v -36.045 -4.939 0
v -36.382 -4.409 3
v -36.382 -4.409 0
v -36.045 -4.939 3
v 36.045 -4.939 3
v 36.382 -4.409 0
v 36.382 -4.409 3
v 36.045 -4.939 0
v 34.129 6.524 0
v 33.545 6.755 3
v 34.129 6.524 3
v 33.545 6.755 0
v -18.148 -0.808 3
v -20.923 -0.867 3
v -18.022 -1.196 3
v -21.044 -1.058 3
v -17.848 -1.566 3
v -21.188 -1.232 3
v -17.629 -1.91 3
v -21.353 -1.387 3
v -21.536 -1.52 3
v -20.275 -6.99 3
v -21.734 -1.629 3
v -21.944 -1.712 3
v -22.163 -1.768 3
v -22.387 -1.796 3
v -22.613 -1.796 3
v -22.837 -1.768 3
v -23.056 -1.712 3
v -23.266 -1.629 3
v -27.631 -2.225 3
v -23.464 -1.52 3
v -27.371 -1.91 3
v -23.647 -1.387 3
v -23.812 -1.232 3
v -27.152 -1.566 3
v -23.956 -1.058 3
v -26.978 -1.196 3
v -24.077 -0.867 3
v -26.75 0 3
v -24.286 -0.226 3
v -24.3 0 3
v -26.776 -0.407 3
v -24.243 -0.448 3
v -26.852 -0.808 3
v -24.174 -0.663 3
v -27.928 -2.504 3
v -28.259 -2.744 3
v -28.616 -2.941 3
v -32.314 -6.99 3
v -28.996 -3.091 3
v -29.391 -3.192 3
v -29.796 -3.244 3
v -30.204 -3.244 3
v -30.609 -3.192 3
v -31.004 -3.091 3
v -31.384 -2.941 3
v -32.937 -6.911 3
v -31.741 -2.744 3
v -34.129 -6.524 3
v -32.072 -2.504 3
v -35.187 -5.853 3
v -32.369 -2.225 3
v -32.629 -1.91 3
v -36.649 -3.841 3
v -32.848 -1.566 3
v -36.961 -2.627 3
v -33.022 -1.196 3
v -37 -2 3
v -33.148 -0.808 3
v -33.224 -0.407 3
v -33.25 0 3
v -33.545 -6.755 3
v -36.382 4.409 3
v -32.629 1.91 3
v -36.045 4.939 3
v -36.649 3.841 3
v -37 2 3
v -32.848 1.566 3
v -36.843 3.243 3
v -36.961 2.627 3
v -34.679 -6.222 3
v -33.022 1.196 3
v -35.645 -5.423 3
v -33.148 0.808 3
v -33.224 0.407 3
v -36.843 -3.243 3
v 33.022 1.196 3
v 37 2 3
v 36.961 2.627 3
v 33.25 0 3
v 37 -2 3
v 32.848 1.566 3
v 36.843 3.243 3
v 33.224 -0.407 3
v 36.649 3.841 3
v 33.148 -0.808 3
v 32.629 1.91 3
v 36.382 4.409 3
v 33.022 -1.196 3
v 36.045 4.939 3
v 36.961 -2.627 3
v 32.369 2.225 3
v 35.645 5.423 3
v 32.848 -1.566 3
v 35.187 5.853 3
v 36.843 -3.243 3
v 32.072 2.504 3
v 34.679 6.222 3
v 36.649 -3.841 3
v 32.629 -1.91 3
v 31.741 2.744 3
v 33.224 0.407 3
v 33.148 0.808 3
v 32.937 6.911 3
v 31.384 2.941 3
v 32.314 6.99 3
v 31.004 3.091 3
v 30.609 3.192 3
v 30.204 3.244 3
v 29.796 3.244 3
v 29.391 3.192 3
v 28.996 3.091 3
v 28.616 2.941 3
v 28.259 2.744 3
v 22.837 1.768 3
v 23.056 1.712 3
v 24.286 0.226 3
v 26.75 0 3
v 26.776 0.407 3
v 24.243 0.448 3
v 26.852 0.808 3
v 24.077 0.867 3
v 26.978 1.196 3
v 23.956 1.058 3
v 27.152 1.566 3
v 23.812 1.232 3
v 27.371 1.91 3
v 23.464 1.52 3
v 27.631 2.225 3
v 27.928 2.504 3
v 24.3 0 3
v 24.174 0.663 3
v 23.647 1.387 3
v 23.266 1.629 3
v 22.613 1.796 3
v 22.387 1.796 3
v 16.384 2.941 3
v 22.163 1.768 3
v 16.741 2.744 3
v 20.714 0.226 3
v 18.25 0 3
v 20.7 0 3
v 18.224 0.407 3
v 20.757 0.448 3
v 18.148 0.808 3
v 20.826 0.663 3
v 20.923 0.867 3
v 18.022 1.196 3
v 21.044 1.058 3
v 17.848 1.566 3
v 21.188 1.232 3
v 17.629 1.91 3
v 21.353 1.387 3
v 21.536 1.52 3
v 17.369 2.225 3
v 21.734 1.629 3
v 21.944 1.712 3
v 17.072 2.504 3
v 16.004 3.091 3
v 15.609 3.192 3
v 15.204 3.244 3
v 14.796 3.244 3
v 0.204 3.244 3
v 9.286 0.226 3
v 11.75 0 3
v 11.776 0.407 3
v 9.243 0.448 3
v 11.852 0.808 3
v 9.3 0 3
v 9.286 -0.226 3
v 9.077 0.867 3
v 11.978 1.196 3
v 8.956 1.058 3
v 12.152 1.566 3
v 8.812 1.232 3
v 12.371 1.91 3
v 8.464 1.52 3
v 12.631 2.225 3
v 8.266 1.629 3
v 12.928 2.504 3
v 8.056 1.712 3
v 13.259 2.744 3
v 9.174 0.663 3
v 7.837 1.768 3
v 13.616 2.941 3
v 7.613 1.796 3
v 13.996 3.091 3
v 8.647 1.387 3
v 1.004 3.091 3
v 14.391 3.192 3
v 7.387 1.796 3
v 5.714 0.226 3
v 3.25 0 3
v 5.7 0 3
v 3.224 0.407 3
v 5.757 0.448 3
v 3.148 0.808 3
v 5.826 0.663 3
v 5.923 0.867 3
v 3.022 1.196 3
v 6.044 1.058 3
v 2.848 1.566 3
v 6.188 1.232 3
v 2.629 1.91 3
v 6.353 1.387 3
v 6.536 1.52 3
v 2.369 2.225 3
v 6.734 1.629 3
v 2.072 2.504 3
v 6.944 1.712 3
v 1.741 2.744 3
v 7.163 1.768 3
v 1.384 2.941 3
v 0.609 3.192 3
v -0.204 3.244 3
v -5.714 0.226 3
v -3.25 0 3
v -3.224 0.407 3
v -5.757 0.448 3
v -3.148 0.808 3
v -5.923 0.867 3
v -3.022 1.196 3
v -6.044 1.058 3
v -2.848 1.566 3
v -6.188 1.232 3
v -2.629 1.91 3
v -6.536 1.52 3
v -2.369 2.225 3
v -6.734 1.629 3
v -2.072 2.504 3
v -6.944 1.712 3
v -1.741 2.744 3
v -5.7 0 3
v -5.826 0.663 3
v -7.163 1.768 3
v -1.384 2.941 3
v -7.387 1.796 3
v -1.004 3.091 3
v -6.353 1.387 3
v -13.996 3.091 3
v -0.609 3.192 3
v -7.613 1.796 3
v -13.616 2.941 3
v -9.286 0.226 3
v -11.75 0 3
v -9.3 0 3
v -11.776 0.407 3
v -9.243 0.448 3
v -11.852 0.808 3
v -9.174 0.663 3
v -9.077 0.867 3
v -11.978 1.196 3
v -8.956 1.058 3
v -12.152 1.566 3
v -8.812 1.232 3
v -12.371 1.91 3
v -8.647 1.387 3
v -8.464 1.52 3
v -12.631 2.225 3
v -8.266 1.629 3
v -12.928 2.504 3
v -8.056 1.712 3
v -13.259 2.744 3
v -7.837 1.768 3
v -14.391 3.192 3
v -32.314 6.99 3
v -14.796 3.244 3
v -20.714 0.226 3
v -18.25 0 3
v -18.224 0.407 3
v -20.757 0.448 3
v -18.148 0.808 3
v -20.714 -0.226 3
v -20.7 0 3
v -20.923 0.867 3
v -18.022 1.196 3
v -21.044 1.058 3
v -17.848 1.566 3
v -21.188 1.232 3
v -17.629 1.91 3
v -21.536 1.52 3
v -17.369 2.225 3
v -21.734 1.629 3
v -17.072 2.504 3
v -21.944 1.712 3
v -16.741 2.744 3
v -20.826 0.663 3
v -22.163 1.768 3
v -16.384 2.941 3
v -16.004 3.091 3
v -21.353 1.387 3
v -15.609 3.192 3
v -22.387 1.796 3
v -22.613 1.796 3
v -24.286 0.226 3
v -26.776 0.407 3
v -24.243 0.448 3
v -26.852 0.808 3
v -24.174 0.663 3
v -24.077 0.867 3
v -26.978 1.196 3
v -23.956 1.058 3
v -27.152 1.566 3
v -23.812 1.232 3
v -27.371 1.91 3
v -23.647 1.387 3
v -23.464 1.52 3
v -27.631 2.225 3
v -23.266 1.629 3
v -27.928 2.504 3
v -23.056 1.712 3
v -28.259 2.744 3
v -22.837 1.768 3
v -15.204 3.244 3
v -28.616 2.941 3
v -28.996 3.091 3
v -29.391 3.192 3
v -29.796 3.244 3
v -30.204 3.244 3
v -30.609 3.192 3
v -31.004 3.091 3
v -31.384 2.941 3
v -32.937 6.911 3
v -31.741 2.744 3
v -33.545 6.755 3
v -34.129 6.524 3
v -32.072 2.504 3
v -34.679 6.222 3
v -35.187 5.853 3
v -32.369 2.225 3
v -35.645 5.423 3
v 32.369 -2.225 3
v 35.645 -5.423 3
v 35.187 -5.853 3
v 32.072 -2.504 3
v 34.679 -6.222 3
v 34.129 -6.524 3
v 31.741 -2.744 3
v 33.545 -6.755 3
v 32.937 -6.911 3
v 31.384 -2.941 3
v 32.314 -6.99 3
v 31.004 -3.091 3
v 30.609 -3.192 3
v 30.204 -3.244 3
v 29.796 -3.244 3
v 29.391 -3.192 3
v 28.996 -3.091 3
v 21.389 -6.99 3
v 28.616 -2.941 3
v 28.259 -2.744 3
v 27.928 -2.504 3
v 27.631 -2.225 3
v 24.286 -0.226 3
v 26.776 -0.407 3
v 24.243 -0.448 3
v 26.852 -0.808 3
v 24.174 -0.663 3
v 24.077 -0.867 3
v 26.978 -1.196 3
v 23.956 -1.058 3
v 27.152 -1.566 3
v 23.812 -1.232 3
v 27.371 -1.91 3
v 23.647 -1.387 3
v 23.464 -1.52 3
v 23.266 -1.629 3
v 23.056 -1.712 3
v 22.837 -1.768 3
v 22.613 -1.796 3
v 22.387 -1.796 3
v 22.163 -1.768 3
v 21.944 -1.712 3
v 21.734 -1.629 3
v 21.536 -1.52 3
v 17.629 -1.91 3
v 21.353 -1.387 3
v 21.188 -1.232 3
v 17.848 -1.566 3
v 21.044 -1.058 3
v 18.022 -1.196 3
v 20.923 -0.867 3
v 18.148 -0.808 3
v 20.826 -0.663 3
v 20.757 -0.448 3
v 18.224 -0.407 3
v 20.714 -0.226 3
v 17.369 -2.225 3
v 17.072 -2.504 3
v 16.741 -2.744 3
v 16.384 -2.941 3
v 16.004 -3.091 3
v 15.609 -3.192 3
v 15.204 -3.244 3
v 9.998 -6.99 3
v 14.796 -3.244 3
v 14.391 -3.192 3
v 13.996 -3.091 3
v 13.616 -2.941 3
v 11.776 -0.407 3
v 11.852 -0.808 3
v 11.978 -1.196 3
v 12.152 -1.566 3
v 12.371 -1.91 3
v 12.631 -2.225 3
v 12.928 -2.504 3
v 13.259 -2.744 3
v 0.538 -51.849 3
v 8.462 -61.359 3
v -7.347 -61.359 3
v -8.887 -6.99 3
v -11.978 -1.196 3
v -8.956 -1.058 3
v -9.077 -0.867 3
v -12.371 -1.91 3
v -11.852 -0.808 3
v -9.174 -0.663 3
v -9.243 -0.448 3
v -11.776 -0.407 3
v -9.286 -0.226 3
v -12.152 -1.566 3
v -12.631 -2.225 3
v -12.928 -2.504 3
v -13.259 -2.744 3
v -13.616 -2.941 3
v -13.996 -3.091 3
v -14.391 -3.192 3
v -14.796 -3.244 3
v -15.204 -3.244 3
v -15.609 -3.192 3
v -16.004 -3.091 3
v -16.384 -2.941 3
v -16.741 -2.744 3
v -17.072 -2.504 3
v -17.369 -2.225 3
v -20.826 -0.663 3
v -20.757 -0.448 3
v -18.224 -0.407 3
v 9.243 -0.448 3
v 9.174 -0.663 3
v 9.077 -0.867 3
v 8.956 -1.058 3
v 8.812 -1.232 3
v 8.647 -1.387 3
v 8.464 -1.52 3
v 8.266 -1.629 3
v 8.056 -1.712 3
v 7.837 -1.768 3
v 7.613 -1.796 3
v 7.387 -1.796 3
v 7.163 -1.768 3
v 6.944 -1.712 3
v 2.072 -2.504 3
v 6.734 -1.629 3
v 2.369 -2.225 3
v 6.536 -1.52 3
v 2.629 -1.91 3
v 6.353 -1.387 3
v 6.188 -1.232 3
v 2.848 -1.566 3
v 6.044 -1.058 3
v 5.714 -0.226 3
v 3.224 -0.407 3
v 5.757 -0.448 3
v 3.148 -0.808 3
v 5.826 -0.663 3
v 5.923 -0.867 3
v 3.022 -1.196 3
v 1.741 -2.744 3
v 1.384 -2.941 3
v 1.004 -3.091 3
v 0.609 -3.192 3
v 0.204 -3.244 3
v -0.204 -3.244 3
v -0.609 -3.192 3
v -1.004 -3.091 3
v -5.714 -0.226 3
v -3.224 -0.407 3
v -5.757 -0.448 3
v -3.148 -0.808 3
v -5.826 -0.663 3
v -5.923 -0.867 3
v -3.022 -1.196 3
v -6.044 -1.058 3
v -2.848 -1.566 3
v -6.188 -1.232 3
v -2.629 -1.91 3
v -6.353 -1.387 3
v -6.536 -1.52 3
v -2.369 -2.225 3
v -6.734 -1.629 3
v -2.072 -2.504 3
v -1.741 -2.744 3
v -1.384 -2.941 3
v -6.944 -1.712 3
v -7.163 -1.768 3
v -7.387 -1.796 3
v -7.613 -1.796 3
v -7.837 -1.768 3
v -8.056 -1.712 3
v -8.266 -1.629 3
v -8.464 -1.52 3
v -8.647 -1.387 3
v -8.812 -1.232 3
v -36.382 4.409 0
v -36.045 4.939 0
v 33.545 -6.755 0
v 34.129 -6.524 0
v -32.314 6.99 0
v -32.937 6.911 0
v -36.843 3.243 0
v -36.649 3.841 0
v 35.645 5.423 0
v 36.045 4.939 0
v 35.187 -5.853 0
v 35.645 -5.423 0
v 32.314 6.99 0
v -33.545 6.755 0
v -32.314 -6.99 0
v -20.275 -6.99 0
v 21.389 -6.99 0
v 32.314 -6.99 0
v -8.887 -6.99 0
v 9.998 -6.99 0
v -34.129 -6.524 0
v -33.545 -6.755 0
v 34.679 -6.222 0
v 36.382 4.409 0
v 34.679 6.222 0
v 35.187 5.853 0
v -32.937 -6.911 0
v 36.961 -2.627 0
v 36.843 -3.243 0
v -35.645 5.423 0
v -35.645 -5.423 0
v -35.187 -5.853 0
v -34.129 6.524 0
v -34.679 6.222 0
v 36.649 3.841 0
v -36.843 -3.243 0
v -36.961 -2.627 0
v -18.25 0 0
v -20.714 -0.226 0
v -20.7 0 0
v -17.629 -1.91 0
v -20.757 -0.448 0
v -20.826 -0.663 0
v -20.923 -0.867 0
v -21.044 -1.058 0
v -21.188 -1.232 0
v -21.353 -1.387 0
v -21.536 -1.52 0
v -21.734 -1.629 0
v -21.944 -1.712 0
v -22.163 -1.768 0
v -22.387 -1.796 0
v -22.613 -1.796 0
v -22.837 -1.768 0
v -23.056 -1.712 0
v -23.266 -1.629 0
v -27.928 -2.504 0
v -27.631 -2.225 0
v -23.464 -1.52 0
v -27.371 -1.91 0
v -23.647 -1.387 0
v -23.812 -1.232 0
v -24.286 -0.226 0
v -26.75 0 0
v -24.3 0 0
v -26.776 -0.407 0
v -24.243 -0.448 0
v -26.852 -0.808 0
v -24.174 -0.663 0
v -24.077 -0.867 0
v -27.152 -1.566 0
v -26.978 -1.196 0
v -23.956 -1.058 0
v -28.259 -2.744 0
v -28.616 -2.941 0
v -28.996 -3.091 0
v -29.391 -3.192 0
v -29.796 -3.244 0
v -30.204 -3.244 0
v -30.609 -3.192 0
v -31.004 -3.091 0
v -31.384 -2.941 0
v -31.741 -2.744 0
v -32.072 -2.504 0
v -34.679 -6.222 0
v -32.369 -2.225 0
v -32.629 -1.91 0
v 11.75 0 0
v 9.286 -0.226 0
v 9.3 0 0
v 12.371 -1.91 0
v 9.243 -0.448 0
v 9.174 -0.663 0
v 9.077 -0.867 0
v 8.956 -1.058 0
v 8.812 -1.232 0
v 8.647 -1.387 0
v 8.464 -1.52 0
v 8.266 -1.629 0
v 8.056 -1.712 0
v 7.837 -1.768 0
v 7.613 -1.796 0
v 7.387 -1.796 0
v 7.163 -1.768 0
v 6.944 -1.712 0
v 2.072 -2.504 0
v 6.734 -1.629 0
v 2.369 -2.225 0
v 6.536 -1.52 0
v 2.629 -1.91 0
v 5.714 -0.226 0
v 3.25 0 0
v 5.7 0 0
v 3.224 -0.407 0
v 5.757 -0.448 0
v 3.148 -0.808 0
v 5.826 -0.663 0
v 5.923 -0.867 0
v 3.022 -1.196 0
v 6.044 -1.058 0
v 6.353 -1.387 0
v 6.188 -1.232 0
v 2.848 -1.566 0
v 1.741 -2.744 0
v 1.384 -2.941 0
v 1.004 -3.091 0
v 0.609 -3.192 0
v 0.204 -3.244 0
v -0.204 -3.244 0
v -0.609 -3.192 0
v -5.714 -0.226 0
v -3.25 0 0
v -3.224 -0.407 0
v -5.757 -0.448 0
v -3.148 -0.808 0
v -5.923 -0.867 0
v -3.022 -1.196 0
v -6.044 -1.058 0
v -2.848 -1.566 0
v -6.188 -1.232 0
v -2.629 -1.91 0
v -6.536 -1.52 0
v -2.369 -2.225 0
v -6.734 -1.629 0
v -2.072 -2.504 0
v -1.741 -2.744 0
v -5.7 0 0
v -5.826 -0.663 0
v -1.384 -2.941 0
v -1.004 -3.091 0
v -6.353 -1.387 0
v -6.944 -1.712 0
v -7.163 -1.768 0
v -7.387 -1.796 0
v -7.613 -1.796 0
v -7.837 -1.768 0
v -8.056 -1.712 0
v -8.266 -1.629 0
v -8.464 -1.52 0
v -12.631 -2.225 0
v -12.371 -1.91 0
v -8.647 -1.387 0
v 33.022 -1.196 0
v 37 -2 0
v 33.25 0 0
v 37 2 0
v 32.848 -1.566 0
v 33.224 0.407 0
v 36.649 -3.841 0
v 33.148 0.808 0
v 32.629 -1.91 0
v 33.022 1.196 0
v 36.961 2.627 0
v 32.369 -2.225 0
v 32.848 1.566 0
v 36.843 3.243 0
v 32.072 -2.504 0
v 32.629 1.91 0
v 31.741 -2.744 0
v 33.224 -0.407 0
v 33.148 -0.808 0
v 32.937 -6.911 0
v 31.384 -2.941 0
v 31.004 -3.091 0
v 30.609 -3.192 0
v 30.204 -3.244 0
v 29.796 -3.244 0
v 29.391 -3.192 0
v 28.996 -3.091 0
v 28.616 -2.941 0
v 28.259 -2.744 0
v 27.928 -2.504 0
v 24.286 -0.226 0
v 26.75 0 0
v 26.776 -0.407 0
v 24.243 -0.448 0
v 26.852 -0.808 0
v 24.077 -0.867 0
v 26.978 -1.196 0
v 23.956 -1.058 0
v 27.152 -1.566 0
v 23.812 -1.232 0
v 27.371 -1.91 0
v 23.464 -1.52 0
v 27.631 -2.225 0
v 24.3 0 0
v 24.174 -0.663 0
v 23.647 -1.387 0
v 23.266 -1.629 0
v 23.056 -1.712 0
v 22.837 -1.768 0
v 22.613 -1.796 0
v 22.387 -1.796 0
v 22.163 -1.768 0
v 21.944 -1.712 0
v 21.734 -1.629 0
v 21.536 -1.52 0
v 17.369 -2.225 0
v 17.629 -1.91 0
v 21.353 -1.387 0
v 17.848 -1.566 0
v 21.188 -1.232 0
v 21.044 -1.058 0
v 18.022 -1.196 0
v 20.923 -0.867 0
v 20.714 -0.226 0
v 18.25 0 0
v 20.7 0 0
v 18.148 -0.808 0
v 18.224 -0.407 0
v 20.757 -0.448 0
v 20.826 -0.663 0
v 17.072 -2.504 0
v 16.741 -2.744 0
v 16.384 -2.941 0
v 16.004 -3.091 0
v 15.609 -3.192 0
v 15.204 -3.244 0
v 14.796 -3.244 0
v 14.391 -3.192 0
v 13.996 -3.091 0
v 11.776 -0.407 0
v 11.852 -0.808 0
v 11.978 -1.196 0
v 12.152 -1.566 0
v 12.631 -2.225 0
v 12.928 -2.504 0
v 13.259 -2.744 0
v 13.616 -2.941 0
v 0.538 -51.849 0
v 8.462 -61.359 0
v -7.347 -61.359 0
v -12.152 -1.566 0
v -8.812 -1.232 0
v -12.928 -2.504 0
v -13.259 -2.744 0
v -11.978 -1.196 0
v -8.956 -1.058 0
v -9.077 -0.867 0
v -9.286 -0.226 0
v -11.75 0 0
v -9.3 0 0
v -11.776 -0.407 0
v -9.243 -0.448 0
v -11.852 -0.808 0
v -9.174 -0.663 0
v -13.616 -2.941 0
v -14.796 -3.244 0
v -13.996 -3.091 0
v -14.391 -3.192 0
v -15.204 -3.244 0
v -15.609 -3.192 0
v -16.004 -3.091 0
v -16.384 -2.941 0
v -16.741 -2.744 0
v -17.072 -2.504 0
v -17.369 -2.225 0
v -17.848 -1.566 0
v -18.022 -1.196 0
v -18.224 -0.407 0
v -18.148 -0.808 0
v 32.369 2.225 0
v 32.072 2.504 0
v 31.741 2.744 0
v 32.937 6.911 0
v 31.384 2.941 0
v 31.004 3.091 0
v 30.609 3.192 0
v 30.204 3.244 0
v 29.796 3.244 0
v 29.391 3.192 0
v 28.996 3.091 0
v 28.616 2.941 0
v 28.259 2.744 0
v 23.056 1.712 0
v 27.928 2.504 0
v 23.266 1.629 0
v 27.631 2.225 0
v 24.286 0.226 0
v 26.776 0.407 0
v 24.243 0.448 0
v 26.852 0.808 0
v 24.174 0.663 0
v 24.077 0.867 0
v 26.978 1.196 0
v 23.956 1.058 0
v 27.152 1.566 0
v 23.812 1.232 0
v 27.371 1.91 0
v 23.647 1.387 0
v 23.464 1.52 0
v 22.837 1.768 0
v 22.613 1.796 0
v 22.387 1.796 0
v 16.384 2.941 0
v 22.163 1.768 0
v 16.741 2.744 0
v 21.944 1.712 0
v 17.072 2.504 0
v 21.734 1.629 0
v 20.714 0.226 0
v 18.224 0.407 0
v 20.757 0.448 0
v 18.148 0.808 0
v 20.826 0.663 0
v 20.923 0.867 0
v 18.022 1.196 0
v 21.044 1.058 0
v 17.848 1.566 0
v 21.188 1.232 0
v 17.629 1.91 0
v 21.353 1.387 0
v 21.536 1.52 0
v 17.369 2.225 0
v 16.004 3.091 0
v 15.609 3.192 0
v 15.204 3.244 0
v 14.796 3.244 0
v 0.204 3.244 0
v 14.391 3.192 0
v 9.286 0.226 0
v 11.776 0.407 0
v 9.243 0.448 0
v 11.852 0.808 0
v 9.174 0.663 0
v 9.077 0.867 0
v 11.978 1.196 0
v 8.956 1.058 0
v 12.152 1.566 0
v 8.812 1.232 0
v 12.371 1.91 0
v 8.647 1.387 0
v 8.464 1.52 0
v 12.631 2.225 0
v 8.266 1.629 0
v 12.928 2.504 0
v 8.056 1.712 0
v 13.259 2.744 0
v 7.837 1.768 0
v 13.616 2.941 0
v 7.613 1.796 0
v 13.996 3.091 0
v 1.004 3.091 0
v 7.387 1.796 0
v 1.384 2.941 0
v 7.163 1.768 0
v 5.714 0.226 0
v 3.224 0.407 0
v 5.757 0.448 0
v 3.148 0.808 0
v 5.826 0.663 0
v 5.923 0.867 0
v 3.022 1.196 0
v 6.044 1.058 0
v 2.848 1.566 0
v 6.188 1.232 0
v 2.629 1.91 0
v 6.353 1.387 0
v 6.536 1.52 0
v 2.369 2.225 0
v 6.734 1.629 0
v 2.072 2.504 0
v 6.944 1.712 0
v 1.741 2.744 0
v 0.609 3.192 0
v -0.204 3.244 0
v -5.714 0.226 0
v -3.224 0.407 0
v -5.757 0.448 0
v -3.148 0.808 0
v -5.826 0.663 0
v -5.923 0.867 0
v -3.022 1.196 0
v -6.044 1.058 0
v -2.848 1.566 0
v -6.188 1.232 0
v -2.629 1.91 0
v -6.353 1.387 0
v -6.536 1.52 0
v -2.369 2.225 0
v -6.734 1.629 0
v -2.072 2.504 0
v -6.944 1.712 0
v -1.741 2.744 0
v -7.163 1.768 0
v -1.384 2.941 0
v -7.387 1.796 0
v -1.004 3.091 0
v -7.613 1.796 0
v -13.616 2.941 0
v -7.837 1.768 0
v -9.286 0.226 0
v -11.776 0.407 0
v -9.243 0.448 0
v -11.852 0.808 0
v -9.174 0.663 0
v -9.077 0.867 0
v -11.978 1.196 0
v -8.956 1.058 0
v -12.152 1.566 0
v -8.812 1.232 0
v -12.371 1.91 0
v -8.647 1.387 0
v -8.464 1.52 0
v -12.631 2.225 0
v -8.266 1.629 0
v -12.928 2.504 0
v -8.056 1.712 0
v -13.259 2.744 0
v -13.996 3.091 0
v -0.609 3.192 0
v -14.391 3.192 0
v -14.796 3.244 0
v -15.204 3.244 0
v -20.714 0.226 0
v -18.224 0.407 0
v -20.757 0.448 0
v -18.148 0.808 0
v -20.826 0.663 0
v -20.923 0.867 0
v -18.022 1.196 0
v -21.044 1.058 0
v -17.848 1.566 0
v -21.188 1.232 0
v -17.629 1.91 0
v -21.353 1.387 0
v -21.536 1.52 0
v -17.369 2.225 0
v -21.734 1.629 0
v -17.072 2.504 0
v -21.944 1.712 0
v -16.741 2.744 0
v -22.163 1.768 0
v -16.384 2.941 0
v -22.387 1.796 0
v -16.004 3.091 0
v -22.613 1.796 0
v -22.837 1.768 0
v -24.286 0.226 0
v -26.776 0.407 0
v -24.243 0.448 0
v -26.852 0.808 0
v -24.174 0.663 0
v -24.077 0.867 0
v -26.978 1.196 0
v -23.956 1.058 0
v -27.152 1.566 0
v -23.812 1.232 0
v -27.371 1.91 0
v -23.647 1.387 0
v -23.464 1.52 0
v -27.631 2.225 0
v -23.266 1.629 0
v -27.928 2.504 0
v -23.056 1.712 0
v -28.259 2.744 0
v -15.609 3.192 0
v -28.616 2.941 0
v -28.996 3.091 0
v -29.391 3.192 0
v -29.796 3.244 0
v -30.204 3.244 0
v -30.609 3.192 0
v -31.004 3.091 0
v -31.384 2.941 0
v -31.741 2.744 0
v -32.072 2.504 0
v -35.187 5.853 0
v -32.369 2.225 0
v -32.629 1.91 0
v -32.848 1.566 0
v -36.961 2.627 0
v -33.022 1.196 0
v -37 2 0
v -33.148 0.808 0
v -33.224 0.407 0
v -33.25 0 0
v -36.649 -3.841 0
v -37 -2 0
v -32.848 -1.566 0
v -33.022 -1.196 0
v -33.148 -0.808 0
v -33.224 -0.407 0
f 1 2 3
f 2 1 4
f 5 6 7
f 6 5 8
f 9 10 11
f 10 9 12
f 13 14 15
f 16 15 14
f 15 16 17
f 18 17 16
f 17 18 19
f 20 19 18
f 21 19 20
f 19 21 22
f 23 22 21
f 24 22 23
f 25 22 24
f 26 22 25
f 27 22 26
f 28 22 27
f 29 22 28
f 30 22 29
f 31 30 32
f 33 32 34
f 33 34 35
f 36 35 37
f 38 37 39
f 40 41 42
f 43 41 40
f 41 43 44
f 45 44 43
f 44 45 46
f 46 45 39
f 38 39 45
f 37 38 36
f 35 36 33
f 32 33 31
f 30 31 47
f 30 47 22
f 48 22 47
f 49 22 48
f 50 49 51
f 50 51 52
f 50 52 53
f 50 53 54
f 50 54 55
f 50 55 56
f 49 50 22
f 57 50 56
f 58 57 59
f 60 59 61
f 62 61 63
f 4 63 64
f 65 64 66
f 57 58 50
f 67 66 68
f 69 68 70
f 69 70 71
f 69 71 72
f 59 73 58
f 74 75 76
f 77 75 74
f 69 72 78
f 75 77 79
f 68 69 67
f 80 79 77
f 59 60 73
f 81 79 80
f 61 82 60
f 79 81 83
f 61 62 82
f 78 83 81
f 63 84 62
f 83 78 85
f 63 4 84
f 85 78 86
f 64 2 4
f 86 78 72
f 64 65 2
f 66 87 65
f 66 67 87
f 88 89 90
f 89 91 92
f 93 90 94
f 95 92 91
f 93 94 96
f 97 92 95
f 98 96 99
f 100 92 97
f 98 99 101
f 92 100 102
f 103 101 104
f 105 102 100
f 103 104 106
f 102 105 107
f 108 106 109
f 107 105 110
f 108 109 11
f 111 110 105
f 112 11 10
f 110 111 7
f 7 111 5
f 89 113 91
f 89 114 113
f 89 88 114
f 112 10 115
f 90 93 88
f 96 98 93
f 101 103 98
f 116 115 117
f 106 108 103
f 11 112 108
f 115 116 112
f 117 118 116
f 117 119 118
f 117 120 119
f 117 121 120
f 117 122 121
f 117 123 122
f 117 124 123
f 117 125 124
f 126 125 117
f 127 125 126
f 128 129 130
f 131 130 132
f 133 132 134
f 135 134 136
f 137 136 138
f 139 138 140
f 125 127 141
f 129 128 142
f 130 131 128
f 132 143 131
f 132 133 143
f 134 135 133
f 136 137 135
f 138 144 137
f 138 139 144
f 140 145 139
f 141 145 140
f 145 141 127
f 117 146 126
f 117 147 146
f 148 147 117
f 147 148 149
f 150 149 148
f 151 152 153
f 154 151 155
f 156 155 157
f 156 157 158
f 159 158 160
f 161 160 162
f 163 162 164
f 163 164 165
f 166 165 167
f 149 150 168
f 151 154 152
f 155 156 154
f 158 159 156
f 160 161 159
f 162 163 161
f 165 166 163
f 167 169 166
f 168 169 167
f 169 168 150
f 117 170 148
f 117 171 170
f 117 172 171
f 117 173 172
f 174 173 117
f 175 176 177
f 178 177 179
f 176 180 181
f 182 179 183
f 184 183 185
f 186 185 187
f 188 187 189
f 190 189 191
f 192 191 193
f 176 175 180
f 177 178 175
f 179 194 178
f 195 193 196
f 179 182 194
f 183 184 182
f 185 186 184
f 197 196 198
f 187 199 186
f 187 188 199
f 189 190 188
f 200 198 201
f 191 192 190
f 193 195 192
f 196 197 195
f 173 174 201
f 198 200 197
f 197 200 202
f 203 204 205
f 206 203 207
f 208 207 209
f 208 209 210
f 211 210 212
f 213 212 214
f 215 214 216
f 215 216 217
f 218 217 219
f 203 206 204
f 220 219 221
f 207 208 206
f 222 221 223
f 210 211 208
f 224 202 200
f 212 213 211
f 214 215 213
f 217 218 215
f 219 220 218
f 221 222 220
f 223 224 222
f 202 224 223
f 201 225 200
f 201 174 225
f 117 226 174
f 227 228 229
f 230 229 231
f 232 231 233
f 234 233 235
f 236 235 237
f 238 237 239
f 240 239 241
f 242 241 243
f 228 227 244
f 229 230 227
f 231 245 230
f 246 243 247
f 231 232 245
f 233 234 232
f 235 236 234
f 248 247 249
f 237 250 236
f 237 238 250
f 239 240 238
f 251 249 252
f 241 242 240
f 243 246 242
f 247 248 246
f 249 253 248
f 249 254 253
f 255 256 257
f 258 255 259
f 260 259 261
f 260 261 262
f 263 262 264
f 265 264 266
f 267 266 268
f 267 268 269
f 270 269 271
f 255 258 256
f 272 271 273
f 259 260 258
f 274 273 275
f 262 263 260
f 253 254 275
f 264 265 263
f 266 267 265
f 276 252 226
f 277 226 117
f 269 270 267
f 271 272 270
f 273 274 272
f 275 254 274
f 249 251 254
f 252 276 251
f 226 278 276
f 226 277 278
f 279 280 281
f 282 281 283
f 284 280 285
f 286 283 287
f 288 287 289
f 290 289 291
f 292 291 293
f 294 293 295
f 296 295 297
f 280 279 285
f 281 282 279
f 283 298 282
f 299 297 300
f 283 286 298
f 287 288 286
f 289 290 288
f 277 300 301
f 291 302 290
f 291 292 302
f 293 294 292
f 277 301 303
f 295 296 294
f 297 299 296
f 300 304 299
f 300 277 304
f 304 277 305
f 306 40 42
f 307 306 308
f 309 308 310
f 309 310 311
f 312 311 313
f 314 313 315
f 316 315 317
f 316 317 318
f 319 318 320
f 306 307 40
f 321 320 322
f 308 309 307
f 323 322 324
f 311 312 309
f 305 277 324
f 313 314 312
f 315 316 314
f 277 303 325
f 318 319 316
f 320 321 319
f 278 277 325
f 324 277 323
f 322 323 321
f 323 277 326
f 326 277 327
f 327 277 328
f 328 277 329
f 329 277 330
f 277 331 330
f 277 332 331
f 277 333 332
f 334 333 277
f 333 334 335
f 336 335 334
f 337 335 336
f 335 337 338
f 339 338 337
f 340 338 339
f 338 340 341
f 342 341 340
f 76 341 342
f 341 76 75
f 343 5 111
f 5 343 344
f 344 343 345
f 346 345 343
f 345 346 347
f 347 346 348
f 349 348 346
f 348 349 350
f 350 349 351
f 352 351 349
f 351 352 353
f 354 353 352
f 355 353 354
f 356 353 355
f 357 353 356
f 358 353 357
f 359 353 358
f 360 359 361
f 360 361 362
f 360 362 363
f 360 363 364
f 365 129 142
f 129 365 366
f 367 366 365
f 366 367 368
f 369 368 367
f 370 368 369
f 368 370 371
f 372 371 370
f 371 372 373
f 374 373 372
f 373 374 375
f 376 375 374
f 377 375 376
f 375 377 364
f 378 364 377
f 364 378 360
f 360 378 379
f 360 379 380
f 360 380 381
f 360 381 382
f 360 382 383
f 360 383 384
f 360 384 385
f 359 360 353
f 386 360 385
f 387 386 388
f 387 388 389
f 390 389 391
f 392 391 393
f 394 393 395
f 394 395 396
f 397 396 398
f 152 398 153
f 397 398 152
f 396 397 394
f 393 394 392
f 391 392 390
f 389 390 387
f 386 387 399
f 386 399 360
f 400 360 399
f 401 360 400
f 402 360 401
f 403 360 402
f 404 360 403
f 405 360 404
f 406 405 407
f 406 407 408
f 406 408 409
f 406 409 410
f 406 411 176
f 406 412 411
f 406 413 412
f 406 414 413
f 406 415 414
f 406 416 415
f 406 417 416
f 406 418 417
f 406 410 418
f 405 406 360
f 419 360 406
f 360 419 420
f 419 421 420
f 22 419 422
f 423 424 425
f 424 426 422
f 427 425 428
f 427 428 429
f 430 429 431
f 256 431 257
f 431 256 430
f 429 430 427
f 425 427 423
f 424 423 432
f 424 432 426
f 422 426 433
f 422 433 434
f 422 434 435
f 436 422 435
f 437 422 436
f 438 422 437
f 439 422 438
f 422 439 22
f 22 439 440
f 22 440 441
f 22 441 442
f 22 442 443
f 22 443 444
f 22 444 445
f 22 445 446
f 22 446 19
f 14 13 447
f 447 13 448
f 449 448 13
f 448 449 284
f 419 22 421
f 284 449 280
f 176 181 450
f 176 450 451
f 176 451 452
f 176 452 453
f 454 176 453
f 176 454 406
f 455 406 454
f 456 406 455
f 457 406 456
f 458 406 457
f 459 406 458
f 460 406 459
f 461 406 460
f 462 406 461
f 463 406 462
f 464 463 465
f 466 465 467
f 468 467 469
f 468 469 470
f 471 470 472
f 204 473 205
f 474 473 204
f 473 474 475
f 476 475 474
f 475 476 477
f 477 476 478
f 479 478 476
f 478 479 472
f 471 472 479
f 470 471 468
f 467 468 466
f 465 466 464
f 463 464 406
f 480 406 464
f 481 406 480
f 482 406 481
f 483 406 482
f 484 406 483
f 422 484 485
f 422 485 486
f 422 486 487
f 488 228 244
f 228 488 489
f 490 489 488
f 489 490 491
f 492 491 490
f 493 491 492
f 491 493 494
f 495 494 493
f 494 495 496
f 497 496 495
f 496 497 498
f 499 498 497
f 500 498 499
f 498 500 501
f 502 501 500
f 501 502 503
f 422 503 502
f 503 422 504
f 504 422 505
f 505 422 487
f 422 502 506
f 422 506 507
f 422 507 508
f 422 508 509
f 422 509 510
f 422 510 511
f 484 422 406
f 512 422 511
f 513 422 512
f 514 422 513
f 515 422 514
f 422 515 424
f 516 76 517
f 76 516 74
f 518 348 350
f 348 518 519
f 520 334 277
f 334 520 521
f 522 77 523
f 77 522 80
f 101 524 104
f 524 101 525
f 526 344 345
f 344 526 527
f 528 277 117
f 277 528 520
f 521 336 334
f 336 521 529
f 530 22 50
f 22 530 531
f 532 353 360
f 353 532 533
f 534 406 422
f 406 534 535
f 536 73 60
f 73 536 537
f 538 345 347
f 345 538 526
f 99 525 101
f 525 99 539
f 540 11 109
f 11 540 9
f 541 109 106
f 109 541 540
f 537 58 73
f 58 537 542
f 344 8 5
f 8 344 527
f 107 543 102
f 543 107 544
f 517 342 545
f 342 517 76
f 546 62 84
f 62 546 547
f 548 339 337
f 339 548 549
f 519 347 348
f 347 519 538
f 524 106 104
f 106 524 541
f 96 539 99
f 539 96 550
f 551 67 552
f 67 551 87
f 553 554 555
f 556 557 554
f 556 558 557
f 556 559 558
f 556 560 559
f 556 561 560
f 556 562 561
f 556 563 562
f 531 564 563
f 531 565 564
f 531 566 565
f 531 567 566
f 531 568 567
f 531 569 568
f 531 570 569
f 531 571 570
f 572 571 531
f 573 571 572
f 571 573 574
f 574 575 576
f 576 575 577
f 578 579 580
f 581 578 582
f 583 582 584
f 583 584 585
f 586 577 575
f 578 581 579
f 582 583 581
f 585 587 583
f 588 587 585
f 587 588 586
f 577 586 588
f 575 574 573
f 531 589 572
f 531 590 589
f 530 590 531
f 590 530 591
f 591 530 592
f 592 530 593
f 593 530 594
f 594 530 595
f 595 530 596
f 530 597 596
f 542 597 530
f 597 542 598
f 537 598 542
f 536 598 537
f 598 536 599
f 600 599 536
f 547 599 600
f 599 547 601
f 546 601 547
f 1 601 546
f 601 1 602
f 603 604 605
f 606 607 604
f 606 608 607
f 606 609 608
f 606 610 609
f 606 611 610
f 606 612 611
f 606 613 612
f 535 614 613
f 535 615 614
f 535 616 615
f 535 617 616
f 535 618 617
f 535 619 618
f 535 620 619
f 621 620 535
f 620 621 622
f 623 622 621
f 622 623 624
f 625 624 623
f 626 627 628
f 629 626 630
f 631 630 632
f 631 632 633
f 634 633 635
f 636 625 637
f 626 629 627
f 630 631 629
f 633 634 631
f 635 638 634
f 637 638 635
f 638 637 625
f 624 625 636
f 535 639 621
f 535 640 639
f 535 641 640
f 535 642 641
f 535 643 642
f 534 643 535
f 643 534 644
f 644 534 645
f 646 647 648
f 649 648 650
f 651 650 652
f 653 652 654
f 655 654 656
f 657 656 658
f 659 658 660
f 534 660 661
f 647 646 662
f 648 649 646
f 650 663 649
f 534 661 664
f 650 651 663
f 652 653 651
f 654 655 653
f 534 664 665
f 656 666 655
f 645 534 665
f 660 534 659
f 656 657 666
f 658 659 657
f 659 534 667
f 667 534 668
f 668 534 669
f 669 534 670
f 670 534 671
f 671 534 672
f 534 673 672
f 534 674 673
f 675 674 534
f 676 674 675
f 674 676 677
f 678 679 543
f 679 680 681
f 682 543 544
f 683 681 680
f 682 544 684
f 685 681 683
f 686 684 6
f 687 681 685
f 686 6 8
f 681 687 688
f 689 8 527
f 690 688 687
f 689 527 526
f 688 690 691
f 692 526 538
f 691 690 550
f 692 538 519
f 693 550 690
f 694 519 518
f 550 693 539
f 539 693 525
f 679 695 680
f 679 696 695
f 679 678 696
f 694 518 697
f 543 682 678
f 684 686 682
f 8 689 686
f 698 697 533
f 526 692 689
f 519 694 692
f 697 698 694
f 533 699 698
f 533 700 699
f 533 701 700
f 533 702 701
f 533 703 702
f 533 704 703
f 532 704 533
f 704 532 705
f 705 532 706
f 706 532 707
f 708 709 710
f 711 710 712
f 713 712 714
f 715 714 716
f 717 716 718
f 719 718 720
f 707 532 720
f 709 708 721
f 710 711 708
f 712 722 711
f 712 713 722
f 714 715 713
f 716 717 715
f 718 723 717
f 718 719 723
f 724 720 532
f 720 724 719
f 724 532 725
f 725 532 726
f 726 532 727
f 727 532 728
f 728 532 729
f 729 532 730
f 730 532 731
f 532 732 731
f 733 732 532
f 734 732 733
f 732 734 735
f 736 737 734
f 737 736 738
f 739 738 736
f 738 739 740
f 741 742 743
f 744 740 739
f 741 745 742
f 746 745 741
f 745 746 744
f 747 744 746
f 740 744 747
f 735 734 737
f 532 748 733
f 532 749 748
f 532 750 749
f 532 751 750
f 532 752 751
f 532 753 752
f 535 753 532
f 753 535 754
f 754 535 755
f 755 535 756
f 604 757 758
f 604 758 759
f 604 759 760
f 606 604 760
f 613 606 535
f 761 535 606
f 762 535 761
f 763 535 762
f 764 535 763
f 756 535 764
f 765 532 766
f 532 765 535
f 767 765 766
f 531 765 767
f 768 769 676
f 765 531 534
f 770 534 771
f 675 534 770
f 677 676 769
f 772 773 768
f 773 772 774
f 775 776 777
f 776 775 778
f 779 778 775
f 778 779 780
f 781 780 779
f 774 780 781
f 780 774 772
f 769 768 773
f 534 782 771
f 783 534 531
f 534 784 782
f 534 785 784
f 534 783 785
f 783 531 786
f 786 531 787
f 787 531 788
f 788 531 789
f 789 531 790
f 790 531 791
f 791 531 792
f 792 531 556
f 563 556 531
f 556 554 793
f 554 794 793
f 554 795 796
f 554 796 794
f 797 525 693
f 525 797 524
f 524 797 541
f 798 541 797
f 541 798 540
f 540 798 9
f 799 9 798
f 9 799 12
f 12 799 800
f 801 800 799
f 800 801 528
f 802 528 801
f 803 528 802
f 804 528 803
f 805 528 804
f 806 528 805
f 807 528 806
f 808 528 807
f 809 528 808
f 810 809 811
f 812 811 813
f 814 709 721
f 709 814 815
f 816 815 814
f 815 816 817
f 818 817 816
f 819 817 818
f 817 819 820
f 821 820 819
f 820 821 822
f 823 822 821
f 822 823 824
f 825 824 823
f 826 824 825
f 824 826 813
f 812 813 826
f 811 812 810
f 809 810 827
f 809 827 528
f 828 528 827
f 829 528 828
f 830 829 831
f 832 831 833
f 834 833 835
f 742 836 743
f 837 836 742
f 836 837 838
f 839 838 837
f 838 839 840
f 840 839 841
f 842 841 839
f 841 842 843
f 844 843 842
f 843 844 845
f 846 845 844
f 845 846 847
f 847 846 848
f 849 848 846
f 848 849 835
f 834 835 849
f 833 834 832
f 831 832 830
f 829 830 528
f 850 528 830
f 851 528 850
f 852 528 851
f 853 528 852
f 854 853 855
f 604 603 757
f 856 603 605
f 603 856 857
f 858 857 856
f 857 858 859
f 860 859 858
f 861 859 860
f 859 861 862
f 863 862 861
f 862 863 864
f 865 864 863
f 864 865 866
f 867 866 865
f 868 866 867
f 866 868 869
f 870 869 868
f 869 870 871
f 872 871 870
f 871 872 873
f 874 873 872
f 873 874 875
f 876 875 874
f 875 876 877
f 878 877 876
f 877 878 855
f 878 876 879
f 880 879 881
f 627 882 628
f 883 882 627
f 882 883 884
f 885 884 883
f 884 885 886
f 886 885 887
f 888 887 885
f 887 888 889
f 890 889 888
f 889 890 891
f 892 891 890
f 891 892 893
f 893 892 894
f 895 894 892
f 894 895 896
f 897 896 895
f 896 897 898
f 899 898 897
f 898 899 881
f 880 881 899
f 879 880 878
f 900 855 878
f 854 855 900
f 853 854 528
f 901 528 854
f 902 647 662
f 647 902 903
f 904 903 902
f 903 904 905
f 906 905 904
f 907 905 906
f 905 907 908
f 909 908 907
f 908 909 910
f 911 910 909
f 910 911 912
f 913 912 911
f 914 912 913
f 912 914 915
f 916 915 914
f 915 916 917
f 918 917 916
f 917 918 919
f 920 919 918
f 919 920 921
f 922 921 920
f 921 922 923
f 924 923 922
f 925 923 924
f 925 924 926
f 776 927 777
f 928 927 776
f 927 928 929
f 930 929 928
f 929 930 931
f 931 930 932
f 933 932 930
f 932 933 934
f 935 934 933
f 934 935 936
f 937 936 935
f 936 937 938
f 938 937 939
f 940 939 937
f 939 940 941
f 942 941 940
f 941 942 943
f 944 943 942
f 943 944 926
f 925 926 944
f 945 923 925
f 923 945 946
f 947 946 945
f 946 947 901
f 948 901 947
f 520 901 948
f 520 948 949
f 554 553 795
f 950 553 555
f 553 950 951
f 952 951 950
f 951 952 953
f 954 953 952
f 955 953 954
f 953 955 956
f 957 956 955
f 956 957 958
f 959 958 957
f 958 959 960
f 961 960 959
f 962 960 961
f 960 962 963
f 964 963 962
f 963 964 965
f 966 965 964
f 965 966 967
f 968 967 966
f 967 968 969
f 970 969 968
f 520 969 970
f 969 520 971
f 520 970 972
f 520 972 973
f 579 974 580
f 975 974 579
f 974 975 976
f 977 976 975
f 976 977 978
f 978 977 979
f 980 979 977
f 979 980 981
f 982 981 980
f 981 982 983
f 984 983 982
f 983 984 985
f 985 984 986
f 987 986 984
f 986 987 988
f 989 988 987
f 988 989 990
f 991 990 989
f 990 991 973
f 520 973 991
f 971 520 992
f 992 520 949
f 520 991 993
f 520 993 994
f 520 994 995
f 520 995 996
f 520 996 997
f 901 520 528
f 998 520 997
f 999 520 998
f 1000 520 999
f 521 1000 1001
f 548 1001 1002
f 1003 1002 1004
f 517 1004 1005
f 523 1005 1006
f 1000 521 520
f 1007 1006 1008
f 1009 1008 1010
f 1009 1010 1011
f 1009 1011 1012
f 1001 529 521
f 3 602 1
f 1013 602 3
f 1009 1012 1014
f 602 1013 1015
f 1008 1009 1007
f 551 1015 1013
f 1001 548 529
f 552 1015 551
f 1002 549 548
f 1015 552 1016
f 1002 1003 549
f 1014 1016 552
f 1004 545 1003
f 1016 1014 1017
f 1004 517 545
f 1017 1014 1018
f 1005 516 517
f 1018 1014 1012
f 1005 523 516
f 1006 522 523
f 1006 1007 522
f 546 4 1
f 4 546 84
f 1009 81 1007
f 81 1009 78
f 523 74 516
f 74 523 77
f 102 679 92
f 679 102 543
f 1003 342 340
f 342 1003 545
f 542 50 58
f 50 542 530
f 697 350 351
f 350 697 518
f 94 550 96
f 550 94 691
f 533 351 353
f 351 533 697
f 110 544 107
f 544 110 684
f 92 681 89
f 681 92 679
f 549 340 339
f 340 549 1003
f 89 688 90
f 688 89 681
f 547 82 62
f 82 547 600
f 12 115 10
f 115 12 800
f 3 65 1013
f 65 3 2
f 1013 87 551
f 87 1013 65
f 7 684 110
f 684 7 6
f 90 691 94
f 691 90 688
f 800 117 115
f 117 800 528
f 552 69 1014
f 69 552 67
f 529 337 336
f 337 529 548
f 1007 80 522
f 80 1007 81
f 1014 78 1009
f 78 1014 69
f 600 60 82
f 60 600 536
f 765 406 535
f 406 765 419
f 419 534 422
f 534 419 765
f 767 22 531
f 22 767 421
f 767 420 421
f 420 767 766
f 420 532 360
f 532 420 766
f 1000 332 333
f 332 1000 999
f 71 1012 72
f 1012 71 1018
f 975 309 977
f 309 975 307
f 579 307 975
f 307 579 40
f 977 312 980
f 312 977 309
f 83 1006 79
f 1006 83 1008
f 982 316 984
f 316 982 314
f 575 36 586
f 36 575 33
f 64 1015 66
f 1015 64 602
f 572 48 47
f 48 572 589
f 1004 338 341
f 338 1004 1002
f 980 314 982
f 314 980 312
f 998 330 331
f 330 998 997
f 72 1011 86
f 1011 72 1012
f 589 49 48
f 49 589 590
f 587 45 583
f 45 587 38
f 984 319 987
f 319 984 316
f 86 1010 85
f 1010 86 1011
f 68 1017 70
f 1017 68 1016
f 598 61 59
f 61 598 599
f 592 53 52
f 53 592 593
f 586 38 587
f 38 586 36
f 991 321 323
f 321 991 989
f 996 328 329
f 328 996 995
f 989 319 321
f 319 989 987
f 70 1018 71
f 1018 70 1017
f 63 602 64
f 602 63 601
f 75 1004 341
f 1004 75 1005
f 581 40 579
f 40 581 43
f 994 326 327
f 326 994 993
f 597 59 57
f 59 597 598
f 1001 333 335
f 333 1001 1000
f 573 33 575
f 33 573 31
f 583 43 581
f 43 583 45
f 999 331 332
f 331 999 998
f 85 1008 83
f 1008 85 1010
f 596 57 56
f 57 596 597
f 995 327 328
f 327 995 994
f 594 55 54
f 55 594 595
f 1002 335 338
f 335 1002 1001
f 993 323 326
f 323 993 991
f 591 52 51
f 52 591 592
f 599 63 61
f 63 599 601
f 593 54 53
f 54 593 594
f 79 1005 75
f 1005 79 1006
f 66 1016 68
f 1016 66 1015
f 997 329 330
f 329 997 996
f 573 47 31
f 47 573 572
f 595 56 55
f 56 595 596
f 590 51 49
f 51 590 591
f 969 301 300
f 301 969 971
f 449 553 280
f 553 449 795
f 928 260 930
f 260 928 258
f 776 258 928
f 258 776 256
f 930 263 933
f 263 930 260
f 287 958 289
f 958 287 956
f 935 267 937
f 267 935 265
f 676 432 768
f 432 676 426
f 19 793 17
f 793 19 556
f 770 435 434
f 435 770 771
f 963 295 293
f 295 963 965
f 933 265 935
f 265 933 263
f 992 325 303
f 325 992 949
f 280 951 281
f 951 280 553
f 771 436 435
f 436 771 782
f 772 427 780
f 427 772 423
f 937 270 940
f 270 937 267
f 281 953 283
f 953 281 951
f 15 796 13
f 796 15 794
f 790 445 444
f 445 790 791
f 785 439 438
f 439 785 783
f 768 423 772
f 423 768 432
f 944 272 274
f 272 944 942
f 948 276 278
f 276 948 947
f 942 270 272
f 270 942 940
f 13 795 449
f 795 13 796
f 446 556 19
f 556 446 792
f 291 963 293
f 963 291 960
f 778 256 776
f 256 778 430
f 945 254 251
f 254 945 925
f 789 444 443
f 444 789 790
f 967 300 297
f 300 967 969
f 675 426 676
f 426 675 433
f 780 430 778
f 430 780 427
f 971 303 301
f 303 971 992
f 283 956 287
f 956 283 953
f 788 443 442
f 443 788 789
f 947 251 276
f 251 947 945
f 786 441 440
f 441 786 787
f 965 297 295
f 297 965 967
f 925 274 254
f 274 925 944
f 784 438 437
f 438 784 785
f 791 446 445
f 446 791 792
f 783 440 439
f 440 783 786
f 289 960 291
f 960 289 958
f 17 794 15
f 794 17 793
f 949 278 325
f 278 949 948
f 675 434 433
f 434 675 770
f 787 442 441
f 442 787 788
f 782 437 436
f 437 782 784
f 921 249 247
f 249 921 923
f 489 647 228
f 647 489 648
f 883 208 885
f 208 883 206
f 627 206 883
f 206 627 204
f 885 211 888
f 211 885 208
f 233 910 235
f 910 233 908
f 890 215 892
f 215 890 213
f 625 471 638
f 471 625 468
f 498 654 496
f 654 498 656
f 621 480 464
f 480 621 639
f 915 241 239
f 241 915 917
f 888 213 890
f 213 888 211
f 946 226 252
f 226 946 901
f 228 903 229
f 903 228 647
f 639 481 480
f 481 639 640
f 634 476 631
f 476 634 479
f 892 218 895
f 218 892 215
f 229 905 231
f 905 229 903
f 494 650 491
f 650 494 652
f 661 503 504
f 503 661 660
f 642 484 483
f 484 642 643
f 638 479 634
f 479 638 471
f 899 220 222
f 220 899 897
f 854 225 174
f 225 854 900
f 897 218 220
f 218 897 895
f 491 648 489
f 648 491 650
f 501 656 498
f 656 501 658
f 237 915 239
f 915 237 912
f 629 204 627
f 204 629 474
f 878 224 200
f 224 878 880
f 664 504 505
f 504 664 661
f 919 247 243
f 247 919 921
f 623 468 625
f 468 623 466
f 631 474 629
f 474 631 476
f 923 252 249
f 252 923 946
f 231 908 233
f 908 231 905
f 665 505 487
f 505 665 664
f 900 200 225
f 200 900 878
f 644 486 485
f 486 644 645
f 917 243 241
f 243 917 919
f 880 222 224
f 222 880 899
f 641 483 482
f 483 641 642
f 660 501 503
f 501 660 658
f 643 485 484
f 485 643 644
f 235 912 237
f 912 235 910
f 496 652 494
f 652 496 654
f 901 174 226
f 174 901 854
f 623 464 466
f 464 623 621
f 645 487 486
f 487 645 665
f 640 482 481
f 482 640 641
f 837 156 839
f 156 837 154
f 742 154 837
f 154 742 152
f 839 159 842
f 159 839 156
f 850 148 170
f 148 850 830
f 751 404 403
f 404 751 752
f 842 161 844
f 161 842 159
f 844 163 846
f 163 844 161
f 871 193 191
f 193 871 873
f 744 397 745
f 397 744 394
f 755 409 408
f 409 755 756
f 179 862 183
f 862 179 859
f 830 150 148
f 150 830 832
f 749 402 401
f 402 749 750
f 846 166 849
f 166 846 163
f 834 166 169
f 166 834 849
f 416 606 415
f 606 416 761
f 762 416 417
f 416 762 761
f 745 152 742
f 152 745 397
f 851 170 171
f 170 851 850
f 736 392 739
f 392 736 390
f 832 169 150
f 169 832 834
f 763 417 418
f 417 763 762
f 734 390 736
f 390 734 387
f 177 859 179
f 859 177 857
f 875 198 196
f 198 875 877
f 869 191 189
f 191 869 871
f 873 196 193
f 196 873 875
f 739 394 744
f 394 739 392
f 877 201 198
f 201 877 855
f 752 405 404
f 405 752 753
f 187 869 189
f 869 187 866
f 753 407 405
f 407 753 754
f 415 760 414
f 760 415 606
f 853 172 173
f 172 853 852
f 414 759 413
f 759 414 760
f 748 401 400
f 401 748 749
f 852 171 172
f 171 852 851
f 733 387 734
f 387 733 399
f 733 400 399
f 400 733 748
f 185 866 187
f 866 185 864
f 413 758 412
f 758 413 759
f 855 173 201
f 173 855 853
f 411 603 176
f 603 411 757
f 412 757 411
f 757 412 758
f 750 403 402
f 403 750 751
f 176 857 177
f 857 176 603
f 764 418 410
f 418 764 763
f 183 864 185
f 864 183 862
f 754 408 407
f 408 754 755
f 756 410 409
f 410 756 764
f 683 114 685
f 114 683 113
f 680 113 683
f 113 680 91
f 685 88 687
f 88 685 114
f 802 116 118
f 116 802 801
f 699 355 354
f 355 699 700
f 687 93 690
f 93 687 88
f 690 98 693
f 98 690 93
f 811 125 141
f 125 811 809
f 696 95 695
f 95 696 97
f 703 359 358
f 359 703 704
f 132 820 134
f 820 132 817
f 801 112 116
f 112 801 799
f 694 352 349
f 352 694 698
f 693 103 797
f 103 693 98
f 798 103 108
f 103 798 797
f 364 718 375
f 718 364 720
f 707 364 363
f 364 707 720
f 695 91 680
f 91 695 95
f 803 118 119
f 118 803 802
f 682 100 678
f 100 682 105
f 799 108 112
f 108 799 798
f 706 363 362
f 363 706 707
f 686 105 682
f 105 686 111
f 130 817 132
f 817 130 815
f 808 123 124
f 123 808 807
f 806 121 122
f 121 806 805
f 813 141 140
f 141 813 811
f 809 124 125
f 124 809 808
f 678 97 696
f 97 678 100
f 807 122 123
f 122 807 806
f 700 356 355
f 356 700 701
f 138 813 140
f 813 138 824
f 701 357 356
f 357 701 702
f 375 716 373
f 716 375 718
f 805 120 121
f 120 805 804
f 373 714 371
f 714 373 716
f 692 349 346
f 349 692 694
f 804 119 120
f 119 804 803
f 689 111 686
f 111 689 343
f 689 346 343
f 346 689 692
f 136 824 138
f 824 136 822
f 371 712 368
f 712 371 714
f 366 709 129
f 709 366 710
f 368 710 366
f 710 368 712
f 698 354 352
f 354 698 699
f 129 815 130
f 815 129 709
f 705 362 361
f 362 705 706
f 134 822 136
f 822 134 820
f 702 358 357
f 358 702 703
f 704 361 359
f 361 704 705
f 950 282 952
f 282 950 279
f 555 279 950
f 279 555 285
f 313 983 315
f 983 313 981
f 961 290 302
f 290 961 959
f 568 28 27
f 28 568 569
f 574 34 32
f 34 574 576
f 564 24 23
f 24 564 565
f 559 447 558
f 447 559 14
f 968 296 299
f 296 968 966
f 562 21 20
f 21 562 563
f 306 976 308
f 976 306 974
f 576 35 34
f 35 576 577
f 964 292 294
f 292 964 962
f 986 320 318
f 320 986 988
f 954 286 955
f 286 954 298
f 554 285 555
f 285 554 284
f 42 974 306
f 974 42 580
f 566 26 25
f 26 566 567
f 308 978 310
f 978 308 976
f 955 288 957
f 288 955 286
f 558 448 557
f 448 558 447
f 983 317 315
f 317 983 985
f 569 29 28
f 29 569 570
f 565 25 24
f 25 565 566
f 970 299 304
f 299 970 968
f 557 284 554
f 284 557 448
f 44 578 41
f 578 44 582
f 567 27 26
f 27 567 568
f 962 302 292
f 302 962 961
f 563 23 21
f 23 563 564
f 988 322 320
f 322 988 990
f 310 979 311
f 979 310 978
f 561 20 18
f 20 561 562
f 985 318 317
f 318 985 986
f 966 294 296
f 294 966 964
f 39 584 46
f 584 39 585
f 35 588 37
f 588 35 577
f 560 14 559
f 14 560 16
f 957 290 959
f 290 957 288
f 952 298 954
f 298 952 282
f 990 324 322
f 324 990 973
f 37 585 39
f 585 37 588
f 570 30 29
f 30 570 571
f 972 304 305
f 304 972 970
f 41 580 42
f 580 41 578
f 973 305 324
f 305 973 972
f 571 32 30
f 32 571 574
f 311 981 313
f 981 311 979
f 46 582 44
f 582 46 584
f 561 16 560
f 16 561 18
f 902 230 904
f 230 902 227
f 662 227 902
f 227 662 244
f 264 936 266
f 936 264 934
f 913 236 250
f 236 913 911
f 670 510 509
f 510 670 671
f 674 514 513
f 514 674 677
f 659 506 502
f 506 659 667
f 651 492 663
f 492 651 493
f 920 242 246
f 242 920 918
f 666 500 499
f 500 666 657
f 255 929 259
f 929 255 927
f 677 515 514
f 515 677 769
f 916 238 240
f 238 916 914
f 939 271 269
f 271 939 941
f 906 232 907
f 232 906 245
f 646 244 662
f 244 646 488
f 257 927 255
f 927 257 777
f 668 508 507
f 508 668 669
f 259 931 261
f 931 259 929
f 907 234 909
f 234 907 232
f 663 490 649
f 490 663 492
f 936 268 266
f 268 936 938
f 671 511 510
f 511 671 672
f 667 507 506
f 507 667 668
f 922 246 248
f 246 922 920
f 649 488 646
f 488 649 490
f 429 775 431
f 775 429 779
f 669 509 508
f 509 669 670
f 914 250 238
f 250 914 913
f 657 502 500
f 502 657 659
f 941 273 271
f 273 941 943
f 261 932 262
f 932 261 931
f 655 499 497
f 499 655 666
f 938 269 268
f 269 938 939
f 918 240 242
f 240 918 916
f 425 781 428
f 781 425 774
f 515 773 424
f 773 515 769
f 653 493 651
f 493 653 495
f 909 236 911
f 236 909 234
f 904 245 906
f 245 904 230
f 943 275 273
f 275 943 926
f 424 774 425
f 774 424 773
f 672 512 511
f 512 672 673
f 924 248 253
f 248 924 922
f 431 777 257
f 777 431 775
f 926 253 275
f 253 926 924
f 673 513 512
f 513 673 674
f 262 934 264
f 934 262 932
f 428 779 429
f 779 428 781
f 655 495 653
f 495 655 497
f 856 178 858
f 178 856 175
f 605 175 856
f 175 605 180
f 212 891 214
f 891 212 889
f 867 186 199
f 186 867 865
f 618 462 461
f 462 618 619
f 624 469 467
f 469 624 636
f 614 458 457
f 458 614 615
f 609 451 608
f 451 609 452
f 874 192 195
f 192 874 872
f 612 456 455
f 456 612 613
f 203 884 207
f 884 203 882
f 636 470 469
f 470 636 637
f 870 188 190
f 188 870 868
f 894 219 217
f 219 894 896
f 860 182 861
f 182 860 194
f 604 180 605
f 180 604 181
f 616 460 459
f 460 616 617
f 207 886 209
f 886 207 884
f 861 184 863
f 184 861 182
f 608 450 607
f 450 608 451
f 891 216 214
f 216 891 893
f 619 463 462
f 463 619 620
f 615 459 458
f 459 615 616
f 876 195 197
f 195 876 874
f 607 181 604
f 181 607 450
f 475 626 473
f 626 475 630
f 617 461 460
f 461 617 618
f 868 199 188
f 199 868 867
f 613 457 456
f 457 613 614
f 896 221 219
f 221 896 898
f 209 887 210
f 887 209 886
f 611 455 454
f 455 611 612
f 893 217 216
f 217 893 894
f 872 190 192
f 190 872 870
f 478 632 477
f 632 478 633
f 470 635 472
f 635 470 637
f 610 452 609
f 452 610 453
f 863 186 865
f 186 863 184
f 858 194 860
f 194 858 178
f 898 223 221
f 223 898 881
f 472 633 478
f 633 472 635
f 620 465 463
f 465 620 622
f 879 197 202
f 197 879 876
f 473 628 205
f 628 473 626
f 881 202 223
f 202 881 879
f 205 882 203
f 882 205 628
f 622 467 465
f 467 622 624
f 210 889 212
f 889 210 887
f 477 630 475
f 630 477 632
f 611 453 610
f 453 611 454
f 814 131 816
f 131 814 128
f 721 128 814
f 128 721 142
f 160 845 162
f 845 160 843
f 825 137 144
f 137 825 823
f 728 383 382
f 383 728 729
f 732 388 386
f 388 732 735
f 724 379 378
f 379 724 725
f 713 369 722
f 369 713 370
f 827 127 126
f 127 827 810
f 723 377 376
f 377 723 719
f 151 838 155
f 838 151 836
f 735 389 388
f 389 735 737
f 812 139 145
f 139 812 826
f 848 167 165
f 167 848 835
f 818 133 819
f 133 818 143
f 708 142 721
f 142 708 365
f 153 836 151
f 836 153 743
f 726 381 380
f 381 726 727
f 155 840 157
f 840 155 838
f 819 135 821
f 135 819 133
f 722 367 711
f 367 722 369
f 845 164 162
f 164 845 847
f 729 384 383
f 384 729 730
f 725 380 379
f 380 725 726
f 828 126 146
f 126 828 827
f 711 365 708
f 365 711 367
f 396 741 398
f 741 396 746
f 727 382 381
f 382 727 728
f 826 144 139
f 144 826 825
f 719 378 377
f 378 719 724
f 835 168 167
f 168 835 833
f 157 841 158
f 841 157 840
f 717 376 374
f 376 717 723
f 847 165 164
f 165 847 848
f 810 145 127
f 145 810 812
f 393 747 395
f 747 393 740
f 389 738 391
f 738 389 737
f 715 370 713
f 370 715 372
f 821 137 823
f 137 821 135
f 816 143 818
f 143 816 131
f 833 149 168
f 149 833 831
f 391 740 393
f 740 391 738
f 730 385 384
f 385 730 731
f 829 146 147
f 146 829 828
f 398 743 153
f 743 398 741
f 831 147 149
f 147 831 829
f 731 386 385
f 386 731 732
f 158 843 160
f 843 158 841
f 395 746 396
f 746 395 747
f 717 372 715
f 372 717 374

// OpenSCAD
$fn = 50;


difference() {
	union() {
		hull() {
			translate(v = [-32.0000000000, 2.0000000000, 0]) {
				cylinder(h = 3, r = 5);
			}
			translate(v = [32.0000000000, 2.0000000000, 0]) {
				cylinder(h = 3, r = 5);
			}
			translate(v = [-32.0000000000, -2.0000000000, 0]) {
				cylinder(h = 3, r = 5);
			}
			translate(v = [32.0000000000, -2.0000000000, 0]) {
				cylinder(h = 3, r = 5);
			}
		}
		translate(v = [0, -5, 0]) {
			linear_extrude(height = 3) {
				text(font = "DejaVu Sans Mono:style=Bold", halign = "center", size = 57.0000000000, text = "V", valign = "top");
			}
		}
	}
	union() {
		translate(v = [-30.0000000000, 0.0000000000, 0]) {
			translate(v = [0, 0, -100]) {
				cylinder(h = 200, r = 3.2500000000);
			}
		}
		translate(v = [-15.0000000000, 0.0000000000, 0]) {
			translate(v = [0, 0, -100]) {
				cylinder(h = 200, r = 3.2500000000);
			}
		}
		translate(v = [0, 0, -100]) {
			cylinder(h = 200, r = 3.2500000000);
		}
		translate(v = [15.0000000000, 0.0000000000, 0]) {
			translate(v = [0, 0, -100]) {
				cylinder(h = 200, r = 3.2500000000);
			}
		}
		translate(v = [30.0000000000, 0.0000000000, 0]) {
			translate(v = [0, 0, -100]) {
				cylinder(h = 200, r = 3.2500000000);
			}
		}
		translate(v = [-30.0000000000, 0.0000000000, 0]) {
			translate(v = [0, 0, -100]) {
				cylinder(h = 200, r = 1.8000000000);
			}
		}
		translate(v = [-22.5000000000, 0.0000000000, 0]) {
			translate(v = [0, 0, -100]) {
				cylinder(h = 200, r = 1.8000000000);
			}
		}
		translate(v = [-15.0000000000, 0.0000000000, 0]) {
			translate(v = [0, 0, -100]) {
				cylinder(h = 200, r = 1.8000000000);
			}
		}
		translate(v = [-7.5000000000, 0.0000000000, 0]) {
			translate(v = [0, 0, -100]) {
				cylinder(h = 200, r = 1.8000000000);
			}
		}
		translate(v = [0, 0, -100]) {
			cylinder(h = 200, r = 1.8000000000);
		}
		translate(v = [7.5000000000, 0.0000000000, 0]) {
			translate(v = [0, 0, -100]) {
				cylinder(h = 200, r = 1.8000000000);
			}
		}
		translate(v = [15.0000000000, 0.0000000000, 0]) {
			translate(v = [0, 0, -100]) {
				cylinder(h = 200, r = 1.8000000000);
			}
		}
		translate(v = [22.5000000000, 0.0000000000, 0]) {
			translate(v = [0, 0, -100]) {
				cylinder(h = 200, r = 1.8000000000);
			}
		}
		translate(v = [30.0000000000, 0.0000000000, 0]) {
			translate(v = [0, 0, -100]) {
				cylinder(h = 200, r = 1.8000000000);
			}
		}
	}
}
